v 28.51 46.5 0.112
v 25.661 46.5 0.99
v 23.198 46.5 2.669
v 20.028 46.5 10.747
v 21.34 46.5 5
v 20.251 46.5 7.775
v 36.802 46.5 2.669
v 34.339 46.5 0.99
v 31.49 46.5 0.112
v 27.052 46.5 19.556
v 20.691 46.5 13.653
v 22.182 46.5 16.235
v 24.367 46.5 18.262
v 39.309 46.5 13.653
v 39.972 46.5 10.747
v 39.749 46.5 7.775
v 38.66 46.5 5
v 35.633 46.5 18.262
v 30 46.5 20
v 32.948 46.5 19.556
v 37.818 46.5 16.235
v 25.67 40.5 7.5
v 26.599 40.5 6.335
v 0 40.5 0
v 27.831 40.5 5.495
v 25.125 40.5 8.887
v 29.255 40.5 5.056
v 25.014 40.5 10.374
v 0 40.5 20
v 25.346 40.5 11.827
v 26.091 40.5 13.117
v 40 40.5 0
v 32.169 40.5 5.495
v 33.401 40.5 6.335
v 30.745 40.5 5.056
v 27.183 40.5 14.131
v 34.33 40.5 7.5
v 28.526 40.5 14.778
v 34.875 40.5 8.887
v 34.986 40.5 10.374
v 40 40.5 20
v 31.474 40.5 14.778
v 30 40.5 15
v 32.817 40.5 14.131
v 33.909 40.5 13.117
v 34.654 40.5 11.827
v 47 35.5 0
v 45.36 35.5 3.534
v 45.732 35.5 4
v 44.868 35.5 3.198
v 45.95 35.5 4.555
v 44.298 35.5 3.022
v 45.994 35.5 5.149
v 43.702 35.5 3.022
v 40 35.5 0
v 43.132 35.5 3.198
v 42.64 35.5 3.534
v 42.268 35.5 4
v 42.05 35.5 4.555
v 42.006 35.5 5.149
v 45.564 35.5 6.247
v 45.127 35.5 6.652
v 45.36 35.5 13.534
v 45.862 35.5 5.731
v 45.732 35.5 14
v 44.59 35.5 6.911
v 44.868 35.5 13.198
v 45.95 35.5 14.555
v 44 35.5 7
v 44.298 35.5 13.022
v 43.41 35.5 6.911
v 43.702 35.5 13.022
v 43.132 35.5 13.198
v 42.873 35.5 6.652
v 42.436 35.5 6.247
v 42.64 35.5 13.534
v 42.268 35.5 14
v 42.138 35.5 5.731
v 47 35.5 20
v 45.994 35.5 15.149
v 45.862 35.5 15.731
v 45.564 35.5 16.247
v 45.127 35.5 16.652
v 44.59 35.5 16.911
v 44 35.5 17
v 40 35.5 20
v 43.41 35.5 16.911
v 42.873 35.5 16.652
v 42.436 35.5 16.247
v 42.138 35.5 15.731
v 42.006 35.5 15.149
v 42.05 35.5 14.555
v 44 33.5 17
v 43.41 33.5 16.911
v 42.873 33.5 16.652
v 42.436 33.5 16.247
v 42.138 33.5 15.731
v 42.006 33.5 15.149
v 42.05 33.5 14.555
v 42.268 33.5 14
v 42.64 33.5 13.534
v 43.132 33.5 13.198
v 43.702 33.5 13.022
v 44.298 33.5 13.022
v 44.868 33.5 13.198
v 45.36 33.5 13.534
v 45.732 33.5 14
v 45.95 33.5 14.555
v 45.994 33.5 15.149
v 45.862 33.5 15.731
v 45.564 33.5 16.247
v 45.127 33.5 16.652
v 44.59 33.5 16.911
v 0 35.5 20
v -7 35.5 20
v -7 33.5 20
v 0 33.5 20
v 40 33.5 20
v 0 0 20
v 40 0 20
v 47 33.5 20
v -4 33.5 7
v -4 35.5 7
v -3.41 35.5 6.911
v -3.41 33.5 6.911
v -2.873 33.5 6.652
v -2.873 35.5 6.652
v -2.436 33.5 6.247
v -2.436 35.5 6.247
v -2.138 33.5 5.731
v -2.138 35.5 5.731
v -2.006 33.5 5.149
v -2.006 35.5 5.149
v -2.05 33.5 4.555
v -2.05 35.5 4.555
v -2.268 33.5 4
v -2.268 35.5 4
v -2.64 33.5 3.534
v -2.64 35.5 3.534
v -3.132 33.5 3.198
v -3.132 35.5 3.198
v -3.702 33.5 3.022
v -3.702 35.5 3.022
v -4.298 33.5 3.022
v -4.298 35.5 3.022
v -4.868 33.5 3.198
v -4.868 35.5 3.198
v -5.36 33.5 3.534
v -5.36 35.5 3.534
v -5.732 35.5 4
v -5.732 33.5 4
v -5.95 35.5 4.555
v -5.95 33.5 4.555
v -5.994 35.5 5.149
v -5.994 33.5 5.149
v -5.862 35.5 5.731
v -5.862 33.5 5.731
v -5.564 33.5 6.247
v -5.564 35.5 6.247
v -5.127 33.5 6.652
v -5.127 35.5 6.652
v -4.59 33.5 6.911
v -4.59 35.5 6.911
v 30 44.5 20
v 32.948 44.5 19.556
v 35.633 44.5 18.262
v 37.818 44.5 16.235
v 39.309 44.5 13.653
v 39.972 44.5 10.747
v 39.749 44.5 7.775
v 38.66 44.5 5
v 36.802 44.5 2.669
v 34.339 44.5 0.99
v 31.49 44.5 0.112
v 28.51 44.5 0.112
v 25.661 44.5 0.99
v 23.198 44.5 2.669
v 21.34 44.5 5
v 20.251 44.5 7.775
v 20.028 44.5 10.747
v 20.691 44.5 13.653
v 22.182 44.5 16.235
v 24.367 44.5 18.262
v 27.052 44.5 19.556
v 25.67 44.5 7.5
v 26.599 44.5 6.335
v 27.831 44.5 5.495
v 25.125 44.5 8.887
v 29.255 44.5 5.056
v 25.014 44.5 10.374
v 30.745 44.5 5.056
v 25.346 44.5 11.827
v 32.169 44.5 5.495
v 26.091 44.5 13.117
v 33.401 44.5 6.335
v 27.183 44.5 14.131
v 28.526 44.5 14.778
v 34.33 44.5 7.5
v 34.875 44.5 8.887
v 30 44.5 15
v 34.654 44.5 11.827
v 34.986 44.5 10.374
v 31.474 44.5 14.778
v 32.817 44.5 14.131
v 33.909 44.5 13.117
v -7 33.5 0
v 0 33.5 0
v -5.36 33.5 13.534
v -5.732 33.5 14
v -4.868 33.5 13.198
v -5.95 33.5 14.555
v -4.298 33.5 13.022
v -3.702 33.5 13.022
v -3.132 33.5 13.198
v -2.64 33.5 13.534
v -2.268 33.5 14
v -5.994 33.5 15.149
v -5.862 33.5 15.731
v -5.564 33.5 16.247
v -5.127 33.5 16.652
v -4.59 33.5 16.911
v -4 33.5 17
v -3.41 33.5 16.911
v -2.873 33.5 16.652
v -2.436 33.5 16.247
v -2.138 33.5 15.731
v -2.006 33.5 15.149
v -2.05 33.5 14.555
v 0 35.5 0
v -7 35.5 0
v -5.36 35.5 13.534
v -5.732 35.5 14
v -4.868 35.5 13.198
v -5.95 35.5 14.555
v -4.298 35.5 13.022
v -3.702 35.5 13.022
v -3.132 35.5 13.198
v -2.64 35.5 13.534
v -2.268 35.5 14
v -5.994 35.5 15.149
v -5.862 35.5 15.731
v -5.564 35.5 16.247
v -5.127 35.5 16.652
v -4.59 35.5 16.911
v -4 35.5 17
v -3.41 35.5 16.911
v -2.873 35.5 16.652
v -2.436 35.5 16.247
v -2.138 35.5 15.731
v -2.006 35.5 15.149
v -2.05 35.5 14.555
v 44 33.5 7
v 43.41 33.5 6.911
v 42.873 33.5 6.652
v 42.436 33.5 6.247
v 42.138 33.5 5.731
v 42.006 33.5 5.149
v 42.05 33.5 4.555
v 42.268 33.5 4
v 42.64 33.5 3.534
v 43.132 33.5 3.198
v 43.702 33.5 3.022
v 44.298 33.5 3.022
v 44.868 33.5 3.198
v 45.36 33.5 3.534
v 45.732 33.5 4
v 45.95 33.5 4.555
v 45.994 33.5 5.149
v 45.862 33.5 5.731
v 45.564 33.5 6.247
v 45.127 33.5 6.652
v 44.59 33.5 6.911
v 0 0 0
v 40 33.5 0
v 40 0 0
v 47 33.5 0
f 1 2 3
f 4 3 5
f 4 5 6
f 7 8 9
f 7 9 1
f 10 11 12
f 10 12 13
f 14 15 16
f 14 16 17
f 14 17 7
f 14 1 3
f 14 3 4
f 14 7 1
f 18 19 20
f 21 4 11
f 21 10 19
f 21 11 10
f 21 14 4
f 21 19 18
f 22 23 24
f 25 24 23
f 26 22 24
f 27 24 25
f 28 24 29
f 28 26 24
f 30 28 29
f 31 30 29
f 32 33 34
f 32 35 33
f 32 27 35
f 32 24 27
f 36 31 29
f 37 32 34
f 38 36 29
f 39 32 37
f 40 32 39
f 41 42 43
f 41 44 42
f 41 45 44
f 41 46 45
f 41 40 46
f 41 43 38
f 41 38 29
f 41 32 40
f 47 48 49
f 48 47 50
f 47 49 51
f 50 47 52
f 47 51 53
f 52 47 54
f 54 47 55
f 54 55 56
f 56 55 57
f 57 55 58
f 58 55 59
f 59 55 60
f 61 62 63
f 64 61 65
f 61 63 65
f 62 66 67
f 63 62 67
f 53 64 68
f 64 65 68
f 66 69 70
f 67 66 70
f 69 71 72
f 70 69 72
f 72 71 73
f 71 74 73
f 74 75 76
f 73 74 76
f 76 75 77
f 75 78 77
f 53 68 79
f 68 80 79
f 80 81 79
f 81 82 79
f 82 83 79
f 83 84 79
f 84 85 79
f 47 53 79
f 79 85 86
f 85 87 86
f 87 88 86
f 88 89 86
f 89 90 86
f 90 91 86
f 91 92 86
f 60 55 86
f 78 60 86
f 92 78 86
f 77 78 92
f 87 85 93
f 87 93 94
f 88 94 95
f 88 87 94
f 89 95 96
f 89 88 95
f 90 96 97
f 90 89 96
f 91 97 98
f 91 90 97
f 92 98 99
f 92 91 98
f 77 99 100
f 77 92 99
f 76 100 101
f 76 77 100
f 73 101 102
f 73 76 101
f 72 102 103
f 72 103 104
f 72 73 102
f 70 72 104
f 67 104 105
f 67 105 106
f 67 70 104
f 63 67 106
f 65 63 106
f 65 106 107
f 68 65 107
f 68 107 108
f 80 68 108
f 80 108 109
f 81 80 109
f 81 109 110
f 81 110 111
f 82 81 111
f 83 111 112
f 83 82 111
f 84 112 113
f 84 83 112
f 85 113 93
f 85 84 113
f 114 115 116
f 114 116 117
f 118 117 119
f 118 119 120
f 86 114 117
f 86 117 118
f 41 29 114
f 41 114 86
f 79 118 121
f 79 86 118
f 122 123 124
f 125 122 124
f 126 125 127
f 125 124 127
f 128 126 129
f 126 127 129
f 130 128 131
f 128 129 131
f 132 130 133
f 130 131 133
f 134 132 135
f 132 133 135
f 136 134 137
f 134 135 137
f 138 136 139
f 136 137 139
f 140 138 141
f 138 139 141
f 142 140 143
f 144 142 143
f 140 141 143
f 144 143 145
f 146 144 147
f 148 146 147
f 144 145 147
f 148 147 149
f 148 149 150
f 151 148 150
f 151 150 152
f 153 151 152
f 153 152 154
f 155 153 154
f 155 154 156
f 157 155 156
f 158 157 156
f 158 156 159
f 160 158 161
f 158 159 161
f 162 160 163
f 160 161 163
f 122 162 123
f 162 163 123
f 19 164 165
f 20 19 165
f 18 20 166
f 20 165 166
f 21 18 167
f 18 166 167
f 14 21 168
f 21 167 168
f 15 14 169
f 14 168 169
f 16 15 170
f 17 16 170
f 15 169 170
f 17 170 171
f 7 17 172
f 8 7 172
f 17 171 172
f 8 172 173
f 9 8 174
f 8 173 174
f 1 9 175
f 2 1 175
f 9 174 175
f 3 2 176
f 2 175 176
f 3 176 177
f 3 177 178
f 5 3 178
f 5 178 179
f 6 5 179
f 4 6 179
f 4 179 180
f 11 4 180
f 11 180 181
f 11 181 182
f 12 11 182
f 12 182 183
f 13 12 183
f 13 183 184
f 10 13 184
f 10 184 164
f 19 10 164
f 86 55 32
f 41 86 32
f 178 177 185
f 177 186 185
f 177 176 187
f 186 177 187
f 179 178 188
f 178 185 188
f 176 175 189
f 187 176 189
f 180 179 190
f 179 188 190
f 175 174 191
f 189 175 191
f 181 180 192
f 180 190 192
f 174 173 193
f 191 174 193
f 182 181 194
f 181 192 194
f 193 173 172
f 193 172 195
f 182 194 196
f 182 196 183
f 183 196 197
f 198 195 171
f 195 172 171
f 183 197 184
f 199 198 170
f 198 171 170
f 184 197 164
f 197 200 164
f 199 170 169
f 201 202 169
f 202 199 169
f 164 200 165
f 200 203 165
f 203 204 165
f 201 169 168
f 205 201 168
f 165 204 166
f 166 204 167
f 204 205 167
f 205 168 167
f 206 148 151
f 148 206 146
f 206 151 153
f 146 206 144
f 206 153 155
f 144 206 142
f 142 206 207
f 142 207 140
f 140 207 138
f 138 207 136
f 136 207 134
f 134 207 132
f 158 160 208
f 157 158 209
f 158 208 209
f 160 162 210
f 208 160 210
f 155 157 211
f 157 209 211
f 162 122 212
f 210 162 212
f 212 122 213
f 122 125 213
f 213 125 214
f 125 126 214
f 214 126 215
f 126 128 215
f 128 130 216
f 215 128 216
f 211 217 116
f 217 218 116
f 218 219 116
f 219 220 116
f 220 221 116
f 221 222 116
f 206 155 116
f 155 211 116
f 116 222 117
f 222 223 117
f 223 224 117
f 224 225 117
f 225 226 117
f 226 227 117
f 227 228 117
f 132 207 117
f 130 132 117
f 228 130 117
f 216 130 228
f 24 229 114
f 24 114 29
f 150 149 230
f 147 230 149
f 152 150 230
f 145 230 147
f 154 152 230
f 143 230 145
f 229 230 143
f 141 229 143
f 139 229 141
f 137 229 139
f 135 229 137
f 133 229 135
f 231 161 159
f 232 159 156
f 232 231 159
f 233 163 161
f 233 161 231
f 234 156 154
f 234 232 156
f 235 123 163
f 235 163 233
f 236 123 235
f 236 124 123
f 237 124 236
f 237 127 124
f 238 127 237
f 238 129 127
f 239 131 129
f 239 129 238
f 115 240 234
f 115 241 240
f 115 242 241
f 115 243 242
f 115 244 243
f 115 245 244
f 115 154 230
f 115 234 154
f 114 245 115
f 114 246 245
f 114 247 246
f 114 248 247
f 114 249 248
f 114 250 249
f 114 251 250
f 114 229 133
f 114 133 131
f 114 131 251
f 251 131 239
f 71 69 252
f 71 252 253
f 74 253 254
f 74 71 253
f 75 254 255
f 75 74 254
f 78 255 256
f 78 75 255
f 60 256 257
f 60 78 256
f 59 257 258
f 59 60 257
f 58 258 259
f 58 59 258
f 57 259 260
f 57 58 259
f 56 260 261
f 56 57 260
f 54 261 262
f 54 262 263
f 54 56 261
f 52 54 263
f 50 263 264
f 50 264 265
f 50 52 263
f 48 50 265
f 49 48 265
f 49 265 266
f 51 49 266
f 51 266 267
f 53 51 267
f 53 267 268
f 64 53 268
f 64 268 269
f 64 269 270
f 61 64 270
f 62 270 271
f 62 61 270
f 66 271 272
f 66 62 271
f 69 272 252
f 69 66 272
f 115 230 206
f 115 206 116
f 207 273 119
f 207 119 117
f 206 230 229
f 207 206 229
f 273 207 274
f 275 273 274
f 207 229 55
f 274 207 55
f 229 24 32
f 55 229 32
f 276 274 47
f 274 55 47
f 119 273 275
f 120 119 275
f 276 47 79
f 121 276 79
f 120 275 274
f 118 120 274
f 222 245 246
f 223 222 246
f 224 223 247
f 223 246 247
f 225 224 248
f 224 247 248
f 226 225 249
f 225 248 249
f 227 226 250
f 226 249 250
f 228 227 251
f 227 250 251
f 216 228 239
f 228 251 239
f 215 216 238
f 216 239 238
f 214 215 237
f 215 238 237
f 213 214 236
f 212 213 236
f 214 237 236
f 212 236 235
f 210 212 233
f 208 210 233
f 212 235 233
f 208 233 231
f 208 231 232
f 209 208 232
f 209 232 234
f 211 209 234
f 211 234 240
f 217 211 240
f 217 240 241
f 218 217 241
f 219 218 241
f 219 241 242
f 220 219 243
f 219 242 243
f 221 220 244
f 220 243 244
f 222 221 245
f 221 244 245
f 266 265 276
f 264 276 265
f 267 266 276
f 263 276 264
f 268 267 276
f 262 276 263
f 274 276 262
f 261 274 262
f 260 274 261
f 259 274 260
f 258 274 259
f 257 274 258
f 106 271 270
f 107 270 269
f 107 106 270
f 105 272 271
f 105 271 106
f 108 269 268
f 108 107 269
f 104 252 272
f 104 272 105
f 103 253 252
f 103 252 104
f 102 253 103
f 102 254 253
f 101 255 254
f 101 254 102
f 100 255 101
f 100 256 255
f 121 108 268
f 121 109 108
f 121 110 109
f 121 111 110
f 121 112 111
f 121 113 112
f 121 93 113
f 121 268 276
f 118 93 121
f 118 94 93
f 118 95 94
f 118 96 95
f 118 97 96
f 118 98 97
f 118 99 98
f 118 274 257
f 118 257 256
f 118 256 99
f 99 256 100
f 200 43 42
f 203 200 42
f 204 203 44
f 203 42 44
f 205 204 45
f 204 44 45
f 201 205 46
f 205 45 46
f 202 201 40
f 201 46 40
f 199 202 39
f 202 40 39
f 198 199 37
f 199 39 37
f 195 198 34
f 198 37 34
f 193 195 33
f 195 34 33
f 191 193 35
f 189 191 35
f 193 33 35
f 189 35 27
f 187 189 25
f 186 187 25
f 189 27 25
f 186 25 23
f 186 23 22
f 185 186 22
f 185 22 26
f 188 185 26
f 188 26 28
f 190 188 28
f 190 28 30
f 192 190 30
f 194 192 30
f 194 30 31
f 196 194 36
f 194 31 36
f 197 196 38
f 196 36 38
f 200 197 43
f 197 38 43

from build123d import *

# Parameters (mm, degrees)
SKETCH1_W           = 40
SKETCH1_H           = 40.5
BOSS_EXTRUDE1_DEPTH = 20
SKETCH2_R           = 10
BOSS_EXTRUDE2_DEPTH = 6
SKETCH5_R           = 10
SKETCH5_R_2         = 5
CUT_EXTRUDE3_DEPTH  = 4
SKETCH6_W           = 20
SKETCH6_H           = 2
BOSS_EXTRUDE3_DEPTH = 7
SKETCH7_R           = 2
CUT_EXTRUDE5_DEPTH  = 2


with BuildPart() as part:
    # Sketch1 → Boss-Extrude1 (new body)
    with BuildSketch(Plane.XY):
        with Locations((20, 20.25)):
            Rectangle(SKETCH1_W, SKETCH1_H)
    extrude(amount=BOSS_EXTRUDE1_DEPTH)

    # Sketch2 → Boss-Extrude2 (add)
    with BuildSketch(Plane(origin=(0, 40.5, 0), x_dir=(1, 0, 0), z_dir=(0, 1, 0))):
        with Locations(Location((30, -10, 0), (0, 0, 270))):
            Circle(SKETCH2_R)
    extrude(amount=BOSS_EXTRUDE2_DEPTH)

    # Sketch5 → Cut-Extrude3 (cut)
    with BuildSketch(Plane(origin=(0, 40.5, 0), x_dir=(1, 0, 0), z_dir=(0, 1, 0))):
        with Locations(Location((30, -10, 0), (0, 0, 270))):
            Circle(SKETCH5_R)
        with Locations(Location((30, -10, 0), (0, 0, 270))):
            Circle(SKETCH5_R_2, mode=Mode.SUBTRACT)
    extrude(amount=CUT_EXTRUDE3_DEPTH, mode=Mode.SUBTRACT)

    # Sketch6 → Boss-Extrude3 (add)
    with BuildSketch(Plane.ZY):
        with Locations((10, 34.5)):
            Rectangle(SKETCH6_W, SKETCH6_H)
    boss_extrude3 = extrude(amount=BOSS_EXTRUDE3_DEPTH)

    # Sketch7 → Cut-Extrude5 (cut)
    with BuildSketch(Plane(origin=(0, 35.5, 0), x_dir=(1, 0, 0), z_dir=(0, 1, 0))):
        with Locations(Location((-4, -15, 0), (0, 0, 270))):
            Circle(SKETCH7_R)
        with Locations(Location((-4, -5, 0), (0, 0, 270))):
            Circle(SKETCH7_R)
    cut_extrude5 = extrude(amount=-CUT_EXTRUDE5_DEPTH, mode=Mode.SUBTRACT)

    # Mirror1: Boss-Extrude3, Cut-Extrude5 across plane
    add(boss_extrude3.mirror(Plane.ZY.offset(-20)))
    add(cut_extrude5.mirror(Plane.ZY.offset(-20)), mode=Mode.SUBTRACT)


solid = part.part
